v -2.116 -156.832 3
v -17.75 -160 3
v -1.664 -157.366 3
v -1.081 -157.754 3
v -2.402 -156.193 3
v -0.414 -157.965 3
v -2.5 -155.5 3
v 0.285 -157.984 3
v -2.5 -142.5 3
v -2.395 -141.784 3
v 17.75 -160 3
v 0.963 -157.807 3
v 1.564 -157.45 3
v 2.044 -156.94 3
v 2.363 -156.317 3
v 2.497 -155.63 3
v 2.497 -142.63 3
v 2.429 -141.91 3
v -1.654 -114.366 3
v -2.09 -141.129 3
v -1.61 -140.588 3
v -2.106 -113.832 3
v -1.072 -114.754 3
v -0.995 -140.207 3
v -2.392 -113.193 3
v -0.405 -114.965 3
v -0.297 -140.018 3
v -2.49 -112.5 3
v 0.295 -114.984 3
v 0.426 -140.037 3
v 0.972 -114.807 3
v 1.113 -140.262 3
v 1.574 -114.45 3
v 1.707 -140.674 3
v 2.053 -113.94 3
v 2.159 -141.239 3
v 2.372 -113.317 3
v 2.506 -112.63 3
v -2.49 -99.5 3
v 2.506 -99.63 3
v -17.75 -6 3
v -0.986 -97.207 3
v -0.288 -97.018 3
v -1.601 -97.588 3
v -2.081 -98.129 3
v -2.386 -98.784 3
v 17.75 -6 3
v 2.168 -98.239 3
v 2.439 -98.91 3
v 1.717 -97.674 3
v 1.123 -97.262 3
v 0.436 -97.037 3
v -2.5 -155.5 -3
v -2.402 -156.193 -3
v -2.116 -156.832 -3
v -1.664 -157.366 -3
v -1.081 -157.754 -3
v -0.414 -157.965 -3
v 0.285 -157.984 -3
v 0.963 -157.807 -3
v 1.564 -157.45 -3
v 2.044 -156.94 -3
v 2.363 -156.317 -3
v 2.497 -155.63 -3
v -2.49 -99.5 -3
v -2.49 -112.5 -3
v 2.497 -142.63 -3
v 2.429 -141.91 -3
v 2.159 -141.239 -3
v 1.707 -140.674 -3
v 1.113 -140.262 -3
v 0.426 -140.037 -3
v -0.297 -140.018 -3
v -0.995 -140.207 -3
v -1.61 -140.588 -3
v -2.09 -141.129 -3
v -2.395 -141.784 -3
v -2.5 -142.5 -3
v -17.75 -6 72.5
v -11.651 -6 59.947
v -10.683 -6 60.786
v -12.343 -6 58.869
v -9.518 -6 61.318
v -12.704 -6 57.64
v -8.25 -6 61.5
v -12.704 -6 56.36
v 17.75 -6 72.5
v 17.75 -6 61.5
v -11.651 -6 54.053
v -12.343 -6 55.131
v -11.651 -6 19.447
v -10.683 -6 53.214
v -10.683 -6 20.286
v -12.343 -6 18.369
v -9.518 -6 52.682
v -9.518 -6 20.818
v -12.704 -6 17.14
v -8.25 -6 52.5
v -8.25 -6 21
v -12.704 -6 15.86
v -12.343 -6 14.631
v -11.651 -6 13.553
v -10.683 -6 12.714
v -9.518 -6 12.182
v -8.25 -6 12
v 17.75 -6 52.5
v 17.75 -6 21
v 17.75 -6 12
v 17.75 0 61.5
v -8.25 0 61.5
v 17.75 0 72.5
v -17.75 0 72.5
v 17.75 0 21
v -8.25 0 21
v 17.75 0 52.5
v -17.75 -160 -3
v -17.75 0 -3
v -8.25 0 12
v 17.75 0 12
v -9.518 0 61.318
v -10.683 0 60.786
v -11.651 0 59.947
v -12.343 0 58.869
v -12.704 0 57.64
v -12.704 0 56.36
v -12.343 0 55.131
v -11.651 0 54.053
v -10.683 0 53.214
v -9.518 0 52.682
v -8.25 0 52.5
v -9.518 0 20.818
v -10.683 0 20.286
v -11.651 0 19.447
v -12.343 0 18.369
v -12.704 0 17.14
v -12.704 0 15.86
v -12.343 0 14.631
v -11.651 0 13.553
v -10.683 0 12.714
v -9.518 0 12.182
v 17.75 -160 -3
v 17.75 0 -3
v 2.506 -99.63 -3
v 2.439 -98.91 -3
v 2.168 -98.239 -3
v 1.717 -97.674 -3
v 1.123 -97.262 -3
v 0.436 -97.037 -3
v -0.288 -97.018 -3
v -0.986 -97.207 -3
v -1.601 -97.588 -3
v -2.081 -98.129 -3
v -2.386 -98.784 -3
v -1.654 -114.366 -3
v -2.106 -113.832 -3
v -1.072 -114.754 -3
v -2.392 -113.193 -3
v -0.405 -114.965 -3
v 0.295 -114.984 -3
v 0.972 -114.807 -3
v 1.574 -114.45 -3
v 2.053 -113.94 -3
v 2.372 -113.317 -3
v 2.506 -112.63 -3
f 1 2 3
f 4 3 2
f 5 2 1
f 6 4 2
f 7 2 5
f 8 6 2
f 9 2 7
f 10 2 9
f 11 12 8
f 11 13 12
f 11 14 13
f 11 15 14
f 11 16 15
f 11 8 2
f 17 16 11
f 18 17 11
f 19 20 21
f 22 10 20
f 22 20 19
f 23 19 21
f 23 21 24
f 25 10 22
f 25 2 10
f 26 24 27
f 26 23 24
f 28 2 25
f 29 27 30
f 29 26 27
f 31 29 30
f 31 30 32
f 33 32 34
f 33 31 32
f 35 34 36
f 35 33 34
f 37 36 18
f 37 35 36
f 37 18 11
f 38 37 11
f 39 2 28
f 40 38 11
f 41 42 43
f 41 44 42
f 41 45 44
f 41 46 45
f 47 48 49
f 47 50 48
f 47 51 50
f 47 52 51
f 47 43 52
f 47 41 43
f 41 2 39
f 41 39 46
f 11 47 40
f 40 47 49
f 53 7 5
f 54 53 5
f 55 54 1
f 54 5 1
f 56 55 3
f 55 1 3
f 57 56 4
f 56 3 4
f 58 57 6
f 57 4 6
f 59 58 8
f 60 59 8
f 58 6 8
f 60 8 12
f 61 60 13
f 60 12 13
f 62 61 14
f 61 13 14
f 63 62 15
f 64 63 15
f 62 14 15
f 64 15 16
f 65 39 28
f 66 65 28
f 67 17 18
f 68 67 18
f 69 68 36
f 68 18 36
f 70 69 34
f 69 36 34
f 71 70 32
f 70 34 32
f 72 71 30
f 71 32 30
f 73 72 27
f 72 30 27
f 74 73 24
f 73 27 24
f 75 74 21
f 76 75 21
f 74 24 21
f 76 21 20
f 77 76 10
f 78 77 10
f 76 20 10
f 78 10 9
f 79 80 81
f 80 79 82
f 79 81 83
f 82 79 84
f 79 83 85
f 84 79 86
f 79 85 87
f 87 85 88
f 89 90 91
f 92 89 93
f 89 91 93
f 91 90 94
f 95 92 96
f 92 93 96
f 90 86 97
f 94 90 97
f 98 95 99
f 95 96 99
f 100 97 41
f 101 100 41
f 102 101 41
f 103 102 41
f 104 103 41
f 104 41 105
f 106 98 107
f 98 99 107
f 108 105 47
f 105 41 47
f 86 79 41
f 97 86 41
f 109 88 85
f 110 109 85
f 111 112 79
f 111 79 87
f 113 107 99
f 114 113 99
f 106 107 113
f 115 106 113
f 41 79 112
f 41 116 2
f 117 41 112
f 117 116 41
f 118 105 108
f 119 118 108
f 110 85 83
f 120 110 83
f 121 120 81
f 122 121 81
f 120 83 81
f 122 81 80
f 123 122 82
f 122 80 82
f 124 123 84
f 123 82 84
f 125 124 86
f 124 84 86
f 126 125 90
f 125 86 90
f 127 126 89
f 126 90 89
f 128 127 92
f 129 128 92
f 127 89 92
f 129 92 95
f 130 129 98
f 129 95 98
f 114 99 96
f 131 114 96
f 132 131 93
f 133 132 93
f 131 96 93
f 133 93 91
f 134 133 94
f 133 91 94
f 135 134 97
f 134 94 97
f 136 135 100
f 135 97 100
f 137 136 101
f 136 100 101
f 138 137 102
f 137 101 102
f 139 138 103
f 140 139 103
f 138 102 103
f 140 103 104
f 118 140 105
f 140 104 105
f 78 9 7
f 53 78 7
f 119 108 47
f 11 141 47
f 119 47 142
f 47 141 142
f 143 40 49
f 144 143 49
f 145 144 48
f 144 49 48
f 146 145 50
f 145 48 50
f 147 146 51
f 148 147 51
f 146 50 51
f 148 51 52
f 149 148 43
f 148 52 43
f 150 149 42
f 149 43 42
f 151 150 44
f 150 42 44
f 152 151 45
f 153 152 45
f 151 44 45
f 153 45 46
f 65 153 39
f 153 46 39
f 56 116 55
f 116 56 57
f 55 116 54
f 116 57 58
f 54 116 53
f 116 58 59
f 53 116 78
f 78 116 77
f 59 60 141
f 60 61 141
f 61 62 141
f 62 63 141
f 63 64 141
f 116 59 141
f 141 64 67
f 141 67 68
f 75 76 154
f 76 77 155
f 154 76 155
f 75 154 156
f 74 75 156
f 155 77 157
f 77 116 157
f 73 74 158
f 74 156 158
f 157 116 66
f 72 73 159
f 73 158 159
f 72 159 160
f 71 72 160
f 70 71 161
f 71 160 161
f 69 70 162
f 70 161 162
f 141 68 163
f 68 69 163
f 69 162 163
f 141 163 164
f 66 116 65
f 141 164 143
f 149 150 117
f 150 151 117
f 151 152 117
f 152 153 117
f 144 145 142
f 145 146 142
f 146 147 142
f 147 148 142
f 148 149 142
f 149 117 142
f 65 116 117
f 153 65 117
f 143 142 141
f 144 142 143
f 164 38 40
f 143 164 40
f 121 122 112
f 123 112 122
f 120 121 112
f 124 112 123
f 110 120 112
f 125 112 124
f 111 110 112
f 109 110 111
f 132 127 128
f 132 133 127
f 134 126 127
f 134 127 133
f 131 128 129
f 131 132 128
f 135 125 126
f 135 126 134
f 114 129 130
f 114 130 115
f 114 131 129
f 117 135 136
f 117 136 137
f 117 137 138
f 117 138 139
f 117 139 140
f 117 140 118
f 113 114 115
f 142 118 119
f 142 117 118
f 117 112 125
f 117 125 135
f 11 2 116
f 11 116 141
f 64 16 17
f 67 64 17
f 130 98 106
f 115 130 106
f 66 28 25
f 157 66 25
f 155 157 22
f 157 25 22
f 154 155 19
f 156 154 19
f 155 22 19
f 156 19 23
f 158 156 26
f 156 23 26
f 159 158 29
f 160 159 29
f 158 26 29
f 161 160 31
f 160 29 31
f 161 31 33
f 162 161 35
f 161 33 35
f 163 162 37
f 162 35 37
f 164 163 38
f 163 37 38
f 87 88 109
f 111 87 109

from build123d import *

# Parameters (mm, degrees)
F0_W     = 35.5
F0_H     = 6
F1_DEPTH = 160
F2_W     = 35.5
F2_H     = 6
F3_DEPTH = 69.5
F5_DEPTH = 25
F6_DEPTH = 25
F8_DEPTH = 25


with BuildPart() as f1:
    # F0 (on Front) → F1 (new body)
    with BuildSketch(Plane.XZ):
        Rectangle(F0_W, F0_H)
    extrude(amount=F1_DEPTH)

    # F2 (on face) → F3 (join)
    with BuildSketch(Plane.XY.offset(3)):
        with Locations((0, -3)):
            Rectangle(F2_W, F2_H)
    extrude(amount=F3_DEPTH)

    # F4 (on face) → F5 (cut)
    with BuildSketch(Plane.XY.offset(3)):
        with BuildLine():
            Line((2.506278, -112.369976), (2.506278, -99.630027))
            ThreePointArc((2.506278, -99.630027), (0.074696, -97.000848), (-2.490338, -99.500002))
            Line((-2.490338, -99.500002), (-2.490338, -112.500002))
            ThreePointArc((-2.490338, -112.500002), (-0.055373, -114.999156), (2.506278, -112.630027))
            Line((2.506278, -112.630027), (2.506278, -112.369976))
        make_face()
    extrude(amount=-F5_DEPTH, mode=Mode.SUBTRACT)

    # F4 (on face) → F6 (cut)
    with BuildSketch(Plane.XY.offset(3)):
        with BuildLine():
            Line((2.496616, -155.369974), (2.496616, -142.630026))
            ThreePointArc((2.496616, -142.630026), (0.065035, -140.000846), (-2.5, -142.5))
            Line((-2.5, -142.5), (-2.5, -155.5))
            ThreePointArc((-2.5, -155.5), (-0.065035, -157.999154), (2.496616, -155.630026))
            Line((2.496616, -155.630026), (2.496616, -155.369974))
        make_face()
    extrude(amount=-F6_DEPTH, mode=Mode.SUBTRACT)

    # F7 (on face) → F8 (cut)
    with BuildSketch(Plane.XZ.offset(6)):
        with BuildLine():
            Line((-8.25, 52.5), (17.75, 52.5))
            Line((17.75, 52.5), (17.75, 61.5))
            Line((17.75, 61.5), (-8.25, 61.5))
            ThreePointArc((-8.25, 61.5), (-12.75, 57), (-8.25, 52.5))
        make_face()
        with BuildLine():
            Line((17.75, 21), (-8.25, 21))
            ThreePointArc((-8.25, 21), (-12.75, 16.5), (-8.25, 12))
            Line((-8.25, 12), (17.75, 12))
            Line((17.75, 12), (17.75, 21))
        make_face()
    extrude(amount=-F8_DEPTH, mode=Mode.SUBTRACT)


solid = f1.part
